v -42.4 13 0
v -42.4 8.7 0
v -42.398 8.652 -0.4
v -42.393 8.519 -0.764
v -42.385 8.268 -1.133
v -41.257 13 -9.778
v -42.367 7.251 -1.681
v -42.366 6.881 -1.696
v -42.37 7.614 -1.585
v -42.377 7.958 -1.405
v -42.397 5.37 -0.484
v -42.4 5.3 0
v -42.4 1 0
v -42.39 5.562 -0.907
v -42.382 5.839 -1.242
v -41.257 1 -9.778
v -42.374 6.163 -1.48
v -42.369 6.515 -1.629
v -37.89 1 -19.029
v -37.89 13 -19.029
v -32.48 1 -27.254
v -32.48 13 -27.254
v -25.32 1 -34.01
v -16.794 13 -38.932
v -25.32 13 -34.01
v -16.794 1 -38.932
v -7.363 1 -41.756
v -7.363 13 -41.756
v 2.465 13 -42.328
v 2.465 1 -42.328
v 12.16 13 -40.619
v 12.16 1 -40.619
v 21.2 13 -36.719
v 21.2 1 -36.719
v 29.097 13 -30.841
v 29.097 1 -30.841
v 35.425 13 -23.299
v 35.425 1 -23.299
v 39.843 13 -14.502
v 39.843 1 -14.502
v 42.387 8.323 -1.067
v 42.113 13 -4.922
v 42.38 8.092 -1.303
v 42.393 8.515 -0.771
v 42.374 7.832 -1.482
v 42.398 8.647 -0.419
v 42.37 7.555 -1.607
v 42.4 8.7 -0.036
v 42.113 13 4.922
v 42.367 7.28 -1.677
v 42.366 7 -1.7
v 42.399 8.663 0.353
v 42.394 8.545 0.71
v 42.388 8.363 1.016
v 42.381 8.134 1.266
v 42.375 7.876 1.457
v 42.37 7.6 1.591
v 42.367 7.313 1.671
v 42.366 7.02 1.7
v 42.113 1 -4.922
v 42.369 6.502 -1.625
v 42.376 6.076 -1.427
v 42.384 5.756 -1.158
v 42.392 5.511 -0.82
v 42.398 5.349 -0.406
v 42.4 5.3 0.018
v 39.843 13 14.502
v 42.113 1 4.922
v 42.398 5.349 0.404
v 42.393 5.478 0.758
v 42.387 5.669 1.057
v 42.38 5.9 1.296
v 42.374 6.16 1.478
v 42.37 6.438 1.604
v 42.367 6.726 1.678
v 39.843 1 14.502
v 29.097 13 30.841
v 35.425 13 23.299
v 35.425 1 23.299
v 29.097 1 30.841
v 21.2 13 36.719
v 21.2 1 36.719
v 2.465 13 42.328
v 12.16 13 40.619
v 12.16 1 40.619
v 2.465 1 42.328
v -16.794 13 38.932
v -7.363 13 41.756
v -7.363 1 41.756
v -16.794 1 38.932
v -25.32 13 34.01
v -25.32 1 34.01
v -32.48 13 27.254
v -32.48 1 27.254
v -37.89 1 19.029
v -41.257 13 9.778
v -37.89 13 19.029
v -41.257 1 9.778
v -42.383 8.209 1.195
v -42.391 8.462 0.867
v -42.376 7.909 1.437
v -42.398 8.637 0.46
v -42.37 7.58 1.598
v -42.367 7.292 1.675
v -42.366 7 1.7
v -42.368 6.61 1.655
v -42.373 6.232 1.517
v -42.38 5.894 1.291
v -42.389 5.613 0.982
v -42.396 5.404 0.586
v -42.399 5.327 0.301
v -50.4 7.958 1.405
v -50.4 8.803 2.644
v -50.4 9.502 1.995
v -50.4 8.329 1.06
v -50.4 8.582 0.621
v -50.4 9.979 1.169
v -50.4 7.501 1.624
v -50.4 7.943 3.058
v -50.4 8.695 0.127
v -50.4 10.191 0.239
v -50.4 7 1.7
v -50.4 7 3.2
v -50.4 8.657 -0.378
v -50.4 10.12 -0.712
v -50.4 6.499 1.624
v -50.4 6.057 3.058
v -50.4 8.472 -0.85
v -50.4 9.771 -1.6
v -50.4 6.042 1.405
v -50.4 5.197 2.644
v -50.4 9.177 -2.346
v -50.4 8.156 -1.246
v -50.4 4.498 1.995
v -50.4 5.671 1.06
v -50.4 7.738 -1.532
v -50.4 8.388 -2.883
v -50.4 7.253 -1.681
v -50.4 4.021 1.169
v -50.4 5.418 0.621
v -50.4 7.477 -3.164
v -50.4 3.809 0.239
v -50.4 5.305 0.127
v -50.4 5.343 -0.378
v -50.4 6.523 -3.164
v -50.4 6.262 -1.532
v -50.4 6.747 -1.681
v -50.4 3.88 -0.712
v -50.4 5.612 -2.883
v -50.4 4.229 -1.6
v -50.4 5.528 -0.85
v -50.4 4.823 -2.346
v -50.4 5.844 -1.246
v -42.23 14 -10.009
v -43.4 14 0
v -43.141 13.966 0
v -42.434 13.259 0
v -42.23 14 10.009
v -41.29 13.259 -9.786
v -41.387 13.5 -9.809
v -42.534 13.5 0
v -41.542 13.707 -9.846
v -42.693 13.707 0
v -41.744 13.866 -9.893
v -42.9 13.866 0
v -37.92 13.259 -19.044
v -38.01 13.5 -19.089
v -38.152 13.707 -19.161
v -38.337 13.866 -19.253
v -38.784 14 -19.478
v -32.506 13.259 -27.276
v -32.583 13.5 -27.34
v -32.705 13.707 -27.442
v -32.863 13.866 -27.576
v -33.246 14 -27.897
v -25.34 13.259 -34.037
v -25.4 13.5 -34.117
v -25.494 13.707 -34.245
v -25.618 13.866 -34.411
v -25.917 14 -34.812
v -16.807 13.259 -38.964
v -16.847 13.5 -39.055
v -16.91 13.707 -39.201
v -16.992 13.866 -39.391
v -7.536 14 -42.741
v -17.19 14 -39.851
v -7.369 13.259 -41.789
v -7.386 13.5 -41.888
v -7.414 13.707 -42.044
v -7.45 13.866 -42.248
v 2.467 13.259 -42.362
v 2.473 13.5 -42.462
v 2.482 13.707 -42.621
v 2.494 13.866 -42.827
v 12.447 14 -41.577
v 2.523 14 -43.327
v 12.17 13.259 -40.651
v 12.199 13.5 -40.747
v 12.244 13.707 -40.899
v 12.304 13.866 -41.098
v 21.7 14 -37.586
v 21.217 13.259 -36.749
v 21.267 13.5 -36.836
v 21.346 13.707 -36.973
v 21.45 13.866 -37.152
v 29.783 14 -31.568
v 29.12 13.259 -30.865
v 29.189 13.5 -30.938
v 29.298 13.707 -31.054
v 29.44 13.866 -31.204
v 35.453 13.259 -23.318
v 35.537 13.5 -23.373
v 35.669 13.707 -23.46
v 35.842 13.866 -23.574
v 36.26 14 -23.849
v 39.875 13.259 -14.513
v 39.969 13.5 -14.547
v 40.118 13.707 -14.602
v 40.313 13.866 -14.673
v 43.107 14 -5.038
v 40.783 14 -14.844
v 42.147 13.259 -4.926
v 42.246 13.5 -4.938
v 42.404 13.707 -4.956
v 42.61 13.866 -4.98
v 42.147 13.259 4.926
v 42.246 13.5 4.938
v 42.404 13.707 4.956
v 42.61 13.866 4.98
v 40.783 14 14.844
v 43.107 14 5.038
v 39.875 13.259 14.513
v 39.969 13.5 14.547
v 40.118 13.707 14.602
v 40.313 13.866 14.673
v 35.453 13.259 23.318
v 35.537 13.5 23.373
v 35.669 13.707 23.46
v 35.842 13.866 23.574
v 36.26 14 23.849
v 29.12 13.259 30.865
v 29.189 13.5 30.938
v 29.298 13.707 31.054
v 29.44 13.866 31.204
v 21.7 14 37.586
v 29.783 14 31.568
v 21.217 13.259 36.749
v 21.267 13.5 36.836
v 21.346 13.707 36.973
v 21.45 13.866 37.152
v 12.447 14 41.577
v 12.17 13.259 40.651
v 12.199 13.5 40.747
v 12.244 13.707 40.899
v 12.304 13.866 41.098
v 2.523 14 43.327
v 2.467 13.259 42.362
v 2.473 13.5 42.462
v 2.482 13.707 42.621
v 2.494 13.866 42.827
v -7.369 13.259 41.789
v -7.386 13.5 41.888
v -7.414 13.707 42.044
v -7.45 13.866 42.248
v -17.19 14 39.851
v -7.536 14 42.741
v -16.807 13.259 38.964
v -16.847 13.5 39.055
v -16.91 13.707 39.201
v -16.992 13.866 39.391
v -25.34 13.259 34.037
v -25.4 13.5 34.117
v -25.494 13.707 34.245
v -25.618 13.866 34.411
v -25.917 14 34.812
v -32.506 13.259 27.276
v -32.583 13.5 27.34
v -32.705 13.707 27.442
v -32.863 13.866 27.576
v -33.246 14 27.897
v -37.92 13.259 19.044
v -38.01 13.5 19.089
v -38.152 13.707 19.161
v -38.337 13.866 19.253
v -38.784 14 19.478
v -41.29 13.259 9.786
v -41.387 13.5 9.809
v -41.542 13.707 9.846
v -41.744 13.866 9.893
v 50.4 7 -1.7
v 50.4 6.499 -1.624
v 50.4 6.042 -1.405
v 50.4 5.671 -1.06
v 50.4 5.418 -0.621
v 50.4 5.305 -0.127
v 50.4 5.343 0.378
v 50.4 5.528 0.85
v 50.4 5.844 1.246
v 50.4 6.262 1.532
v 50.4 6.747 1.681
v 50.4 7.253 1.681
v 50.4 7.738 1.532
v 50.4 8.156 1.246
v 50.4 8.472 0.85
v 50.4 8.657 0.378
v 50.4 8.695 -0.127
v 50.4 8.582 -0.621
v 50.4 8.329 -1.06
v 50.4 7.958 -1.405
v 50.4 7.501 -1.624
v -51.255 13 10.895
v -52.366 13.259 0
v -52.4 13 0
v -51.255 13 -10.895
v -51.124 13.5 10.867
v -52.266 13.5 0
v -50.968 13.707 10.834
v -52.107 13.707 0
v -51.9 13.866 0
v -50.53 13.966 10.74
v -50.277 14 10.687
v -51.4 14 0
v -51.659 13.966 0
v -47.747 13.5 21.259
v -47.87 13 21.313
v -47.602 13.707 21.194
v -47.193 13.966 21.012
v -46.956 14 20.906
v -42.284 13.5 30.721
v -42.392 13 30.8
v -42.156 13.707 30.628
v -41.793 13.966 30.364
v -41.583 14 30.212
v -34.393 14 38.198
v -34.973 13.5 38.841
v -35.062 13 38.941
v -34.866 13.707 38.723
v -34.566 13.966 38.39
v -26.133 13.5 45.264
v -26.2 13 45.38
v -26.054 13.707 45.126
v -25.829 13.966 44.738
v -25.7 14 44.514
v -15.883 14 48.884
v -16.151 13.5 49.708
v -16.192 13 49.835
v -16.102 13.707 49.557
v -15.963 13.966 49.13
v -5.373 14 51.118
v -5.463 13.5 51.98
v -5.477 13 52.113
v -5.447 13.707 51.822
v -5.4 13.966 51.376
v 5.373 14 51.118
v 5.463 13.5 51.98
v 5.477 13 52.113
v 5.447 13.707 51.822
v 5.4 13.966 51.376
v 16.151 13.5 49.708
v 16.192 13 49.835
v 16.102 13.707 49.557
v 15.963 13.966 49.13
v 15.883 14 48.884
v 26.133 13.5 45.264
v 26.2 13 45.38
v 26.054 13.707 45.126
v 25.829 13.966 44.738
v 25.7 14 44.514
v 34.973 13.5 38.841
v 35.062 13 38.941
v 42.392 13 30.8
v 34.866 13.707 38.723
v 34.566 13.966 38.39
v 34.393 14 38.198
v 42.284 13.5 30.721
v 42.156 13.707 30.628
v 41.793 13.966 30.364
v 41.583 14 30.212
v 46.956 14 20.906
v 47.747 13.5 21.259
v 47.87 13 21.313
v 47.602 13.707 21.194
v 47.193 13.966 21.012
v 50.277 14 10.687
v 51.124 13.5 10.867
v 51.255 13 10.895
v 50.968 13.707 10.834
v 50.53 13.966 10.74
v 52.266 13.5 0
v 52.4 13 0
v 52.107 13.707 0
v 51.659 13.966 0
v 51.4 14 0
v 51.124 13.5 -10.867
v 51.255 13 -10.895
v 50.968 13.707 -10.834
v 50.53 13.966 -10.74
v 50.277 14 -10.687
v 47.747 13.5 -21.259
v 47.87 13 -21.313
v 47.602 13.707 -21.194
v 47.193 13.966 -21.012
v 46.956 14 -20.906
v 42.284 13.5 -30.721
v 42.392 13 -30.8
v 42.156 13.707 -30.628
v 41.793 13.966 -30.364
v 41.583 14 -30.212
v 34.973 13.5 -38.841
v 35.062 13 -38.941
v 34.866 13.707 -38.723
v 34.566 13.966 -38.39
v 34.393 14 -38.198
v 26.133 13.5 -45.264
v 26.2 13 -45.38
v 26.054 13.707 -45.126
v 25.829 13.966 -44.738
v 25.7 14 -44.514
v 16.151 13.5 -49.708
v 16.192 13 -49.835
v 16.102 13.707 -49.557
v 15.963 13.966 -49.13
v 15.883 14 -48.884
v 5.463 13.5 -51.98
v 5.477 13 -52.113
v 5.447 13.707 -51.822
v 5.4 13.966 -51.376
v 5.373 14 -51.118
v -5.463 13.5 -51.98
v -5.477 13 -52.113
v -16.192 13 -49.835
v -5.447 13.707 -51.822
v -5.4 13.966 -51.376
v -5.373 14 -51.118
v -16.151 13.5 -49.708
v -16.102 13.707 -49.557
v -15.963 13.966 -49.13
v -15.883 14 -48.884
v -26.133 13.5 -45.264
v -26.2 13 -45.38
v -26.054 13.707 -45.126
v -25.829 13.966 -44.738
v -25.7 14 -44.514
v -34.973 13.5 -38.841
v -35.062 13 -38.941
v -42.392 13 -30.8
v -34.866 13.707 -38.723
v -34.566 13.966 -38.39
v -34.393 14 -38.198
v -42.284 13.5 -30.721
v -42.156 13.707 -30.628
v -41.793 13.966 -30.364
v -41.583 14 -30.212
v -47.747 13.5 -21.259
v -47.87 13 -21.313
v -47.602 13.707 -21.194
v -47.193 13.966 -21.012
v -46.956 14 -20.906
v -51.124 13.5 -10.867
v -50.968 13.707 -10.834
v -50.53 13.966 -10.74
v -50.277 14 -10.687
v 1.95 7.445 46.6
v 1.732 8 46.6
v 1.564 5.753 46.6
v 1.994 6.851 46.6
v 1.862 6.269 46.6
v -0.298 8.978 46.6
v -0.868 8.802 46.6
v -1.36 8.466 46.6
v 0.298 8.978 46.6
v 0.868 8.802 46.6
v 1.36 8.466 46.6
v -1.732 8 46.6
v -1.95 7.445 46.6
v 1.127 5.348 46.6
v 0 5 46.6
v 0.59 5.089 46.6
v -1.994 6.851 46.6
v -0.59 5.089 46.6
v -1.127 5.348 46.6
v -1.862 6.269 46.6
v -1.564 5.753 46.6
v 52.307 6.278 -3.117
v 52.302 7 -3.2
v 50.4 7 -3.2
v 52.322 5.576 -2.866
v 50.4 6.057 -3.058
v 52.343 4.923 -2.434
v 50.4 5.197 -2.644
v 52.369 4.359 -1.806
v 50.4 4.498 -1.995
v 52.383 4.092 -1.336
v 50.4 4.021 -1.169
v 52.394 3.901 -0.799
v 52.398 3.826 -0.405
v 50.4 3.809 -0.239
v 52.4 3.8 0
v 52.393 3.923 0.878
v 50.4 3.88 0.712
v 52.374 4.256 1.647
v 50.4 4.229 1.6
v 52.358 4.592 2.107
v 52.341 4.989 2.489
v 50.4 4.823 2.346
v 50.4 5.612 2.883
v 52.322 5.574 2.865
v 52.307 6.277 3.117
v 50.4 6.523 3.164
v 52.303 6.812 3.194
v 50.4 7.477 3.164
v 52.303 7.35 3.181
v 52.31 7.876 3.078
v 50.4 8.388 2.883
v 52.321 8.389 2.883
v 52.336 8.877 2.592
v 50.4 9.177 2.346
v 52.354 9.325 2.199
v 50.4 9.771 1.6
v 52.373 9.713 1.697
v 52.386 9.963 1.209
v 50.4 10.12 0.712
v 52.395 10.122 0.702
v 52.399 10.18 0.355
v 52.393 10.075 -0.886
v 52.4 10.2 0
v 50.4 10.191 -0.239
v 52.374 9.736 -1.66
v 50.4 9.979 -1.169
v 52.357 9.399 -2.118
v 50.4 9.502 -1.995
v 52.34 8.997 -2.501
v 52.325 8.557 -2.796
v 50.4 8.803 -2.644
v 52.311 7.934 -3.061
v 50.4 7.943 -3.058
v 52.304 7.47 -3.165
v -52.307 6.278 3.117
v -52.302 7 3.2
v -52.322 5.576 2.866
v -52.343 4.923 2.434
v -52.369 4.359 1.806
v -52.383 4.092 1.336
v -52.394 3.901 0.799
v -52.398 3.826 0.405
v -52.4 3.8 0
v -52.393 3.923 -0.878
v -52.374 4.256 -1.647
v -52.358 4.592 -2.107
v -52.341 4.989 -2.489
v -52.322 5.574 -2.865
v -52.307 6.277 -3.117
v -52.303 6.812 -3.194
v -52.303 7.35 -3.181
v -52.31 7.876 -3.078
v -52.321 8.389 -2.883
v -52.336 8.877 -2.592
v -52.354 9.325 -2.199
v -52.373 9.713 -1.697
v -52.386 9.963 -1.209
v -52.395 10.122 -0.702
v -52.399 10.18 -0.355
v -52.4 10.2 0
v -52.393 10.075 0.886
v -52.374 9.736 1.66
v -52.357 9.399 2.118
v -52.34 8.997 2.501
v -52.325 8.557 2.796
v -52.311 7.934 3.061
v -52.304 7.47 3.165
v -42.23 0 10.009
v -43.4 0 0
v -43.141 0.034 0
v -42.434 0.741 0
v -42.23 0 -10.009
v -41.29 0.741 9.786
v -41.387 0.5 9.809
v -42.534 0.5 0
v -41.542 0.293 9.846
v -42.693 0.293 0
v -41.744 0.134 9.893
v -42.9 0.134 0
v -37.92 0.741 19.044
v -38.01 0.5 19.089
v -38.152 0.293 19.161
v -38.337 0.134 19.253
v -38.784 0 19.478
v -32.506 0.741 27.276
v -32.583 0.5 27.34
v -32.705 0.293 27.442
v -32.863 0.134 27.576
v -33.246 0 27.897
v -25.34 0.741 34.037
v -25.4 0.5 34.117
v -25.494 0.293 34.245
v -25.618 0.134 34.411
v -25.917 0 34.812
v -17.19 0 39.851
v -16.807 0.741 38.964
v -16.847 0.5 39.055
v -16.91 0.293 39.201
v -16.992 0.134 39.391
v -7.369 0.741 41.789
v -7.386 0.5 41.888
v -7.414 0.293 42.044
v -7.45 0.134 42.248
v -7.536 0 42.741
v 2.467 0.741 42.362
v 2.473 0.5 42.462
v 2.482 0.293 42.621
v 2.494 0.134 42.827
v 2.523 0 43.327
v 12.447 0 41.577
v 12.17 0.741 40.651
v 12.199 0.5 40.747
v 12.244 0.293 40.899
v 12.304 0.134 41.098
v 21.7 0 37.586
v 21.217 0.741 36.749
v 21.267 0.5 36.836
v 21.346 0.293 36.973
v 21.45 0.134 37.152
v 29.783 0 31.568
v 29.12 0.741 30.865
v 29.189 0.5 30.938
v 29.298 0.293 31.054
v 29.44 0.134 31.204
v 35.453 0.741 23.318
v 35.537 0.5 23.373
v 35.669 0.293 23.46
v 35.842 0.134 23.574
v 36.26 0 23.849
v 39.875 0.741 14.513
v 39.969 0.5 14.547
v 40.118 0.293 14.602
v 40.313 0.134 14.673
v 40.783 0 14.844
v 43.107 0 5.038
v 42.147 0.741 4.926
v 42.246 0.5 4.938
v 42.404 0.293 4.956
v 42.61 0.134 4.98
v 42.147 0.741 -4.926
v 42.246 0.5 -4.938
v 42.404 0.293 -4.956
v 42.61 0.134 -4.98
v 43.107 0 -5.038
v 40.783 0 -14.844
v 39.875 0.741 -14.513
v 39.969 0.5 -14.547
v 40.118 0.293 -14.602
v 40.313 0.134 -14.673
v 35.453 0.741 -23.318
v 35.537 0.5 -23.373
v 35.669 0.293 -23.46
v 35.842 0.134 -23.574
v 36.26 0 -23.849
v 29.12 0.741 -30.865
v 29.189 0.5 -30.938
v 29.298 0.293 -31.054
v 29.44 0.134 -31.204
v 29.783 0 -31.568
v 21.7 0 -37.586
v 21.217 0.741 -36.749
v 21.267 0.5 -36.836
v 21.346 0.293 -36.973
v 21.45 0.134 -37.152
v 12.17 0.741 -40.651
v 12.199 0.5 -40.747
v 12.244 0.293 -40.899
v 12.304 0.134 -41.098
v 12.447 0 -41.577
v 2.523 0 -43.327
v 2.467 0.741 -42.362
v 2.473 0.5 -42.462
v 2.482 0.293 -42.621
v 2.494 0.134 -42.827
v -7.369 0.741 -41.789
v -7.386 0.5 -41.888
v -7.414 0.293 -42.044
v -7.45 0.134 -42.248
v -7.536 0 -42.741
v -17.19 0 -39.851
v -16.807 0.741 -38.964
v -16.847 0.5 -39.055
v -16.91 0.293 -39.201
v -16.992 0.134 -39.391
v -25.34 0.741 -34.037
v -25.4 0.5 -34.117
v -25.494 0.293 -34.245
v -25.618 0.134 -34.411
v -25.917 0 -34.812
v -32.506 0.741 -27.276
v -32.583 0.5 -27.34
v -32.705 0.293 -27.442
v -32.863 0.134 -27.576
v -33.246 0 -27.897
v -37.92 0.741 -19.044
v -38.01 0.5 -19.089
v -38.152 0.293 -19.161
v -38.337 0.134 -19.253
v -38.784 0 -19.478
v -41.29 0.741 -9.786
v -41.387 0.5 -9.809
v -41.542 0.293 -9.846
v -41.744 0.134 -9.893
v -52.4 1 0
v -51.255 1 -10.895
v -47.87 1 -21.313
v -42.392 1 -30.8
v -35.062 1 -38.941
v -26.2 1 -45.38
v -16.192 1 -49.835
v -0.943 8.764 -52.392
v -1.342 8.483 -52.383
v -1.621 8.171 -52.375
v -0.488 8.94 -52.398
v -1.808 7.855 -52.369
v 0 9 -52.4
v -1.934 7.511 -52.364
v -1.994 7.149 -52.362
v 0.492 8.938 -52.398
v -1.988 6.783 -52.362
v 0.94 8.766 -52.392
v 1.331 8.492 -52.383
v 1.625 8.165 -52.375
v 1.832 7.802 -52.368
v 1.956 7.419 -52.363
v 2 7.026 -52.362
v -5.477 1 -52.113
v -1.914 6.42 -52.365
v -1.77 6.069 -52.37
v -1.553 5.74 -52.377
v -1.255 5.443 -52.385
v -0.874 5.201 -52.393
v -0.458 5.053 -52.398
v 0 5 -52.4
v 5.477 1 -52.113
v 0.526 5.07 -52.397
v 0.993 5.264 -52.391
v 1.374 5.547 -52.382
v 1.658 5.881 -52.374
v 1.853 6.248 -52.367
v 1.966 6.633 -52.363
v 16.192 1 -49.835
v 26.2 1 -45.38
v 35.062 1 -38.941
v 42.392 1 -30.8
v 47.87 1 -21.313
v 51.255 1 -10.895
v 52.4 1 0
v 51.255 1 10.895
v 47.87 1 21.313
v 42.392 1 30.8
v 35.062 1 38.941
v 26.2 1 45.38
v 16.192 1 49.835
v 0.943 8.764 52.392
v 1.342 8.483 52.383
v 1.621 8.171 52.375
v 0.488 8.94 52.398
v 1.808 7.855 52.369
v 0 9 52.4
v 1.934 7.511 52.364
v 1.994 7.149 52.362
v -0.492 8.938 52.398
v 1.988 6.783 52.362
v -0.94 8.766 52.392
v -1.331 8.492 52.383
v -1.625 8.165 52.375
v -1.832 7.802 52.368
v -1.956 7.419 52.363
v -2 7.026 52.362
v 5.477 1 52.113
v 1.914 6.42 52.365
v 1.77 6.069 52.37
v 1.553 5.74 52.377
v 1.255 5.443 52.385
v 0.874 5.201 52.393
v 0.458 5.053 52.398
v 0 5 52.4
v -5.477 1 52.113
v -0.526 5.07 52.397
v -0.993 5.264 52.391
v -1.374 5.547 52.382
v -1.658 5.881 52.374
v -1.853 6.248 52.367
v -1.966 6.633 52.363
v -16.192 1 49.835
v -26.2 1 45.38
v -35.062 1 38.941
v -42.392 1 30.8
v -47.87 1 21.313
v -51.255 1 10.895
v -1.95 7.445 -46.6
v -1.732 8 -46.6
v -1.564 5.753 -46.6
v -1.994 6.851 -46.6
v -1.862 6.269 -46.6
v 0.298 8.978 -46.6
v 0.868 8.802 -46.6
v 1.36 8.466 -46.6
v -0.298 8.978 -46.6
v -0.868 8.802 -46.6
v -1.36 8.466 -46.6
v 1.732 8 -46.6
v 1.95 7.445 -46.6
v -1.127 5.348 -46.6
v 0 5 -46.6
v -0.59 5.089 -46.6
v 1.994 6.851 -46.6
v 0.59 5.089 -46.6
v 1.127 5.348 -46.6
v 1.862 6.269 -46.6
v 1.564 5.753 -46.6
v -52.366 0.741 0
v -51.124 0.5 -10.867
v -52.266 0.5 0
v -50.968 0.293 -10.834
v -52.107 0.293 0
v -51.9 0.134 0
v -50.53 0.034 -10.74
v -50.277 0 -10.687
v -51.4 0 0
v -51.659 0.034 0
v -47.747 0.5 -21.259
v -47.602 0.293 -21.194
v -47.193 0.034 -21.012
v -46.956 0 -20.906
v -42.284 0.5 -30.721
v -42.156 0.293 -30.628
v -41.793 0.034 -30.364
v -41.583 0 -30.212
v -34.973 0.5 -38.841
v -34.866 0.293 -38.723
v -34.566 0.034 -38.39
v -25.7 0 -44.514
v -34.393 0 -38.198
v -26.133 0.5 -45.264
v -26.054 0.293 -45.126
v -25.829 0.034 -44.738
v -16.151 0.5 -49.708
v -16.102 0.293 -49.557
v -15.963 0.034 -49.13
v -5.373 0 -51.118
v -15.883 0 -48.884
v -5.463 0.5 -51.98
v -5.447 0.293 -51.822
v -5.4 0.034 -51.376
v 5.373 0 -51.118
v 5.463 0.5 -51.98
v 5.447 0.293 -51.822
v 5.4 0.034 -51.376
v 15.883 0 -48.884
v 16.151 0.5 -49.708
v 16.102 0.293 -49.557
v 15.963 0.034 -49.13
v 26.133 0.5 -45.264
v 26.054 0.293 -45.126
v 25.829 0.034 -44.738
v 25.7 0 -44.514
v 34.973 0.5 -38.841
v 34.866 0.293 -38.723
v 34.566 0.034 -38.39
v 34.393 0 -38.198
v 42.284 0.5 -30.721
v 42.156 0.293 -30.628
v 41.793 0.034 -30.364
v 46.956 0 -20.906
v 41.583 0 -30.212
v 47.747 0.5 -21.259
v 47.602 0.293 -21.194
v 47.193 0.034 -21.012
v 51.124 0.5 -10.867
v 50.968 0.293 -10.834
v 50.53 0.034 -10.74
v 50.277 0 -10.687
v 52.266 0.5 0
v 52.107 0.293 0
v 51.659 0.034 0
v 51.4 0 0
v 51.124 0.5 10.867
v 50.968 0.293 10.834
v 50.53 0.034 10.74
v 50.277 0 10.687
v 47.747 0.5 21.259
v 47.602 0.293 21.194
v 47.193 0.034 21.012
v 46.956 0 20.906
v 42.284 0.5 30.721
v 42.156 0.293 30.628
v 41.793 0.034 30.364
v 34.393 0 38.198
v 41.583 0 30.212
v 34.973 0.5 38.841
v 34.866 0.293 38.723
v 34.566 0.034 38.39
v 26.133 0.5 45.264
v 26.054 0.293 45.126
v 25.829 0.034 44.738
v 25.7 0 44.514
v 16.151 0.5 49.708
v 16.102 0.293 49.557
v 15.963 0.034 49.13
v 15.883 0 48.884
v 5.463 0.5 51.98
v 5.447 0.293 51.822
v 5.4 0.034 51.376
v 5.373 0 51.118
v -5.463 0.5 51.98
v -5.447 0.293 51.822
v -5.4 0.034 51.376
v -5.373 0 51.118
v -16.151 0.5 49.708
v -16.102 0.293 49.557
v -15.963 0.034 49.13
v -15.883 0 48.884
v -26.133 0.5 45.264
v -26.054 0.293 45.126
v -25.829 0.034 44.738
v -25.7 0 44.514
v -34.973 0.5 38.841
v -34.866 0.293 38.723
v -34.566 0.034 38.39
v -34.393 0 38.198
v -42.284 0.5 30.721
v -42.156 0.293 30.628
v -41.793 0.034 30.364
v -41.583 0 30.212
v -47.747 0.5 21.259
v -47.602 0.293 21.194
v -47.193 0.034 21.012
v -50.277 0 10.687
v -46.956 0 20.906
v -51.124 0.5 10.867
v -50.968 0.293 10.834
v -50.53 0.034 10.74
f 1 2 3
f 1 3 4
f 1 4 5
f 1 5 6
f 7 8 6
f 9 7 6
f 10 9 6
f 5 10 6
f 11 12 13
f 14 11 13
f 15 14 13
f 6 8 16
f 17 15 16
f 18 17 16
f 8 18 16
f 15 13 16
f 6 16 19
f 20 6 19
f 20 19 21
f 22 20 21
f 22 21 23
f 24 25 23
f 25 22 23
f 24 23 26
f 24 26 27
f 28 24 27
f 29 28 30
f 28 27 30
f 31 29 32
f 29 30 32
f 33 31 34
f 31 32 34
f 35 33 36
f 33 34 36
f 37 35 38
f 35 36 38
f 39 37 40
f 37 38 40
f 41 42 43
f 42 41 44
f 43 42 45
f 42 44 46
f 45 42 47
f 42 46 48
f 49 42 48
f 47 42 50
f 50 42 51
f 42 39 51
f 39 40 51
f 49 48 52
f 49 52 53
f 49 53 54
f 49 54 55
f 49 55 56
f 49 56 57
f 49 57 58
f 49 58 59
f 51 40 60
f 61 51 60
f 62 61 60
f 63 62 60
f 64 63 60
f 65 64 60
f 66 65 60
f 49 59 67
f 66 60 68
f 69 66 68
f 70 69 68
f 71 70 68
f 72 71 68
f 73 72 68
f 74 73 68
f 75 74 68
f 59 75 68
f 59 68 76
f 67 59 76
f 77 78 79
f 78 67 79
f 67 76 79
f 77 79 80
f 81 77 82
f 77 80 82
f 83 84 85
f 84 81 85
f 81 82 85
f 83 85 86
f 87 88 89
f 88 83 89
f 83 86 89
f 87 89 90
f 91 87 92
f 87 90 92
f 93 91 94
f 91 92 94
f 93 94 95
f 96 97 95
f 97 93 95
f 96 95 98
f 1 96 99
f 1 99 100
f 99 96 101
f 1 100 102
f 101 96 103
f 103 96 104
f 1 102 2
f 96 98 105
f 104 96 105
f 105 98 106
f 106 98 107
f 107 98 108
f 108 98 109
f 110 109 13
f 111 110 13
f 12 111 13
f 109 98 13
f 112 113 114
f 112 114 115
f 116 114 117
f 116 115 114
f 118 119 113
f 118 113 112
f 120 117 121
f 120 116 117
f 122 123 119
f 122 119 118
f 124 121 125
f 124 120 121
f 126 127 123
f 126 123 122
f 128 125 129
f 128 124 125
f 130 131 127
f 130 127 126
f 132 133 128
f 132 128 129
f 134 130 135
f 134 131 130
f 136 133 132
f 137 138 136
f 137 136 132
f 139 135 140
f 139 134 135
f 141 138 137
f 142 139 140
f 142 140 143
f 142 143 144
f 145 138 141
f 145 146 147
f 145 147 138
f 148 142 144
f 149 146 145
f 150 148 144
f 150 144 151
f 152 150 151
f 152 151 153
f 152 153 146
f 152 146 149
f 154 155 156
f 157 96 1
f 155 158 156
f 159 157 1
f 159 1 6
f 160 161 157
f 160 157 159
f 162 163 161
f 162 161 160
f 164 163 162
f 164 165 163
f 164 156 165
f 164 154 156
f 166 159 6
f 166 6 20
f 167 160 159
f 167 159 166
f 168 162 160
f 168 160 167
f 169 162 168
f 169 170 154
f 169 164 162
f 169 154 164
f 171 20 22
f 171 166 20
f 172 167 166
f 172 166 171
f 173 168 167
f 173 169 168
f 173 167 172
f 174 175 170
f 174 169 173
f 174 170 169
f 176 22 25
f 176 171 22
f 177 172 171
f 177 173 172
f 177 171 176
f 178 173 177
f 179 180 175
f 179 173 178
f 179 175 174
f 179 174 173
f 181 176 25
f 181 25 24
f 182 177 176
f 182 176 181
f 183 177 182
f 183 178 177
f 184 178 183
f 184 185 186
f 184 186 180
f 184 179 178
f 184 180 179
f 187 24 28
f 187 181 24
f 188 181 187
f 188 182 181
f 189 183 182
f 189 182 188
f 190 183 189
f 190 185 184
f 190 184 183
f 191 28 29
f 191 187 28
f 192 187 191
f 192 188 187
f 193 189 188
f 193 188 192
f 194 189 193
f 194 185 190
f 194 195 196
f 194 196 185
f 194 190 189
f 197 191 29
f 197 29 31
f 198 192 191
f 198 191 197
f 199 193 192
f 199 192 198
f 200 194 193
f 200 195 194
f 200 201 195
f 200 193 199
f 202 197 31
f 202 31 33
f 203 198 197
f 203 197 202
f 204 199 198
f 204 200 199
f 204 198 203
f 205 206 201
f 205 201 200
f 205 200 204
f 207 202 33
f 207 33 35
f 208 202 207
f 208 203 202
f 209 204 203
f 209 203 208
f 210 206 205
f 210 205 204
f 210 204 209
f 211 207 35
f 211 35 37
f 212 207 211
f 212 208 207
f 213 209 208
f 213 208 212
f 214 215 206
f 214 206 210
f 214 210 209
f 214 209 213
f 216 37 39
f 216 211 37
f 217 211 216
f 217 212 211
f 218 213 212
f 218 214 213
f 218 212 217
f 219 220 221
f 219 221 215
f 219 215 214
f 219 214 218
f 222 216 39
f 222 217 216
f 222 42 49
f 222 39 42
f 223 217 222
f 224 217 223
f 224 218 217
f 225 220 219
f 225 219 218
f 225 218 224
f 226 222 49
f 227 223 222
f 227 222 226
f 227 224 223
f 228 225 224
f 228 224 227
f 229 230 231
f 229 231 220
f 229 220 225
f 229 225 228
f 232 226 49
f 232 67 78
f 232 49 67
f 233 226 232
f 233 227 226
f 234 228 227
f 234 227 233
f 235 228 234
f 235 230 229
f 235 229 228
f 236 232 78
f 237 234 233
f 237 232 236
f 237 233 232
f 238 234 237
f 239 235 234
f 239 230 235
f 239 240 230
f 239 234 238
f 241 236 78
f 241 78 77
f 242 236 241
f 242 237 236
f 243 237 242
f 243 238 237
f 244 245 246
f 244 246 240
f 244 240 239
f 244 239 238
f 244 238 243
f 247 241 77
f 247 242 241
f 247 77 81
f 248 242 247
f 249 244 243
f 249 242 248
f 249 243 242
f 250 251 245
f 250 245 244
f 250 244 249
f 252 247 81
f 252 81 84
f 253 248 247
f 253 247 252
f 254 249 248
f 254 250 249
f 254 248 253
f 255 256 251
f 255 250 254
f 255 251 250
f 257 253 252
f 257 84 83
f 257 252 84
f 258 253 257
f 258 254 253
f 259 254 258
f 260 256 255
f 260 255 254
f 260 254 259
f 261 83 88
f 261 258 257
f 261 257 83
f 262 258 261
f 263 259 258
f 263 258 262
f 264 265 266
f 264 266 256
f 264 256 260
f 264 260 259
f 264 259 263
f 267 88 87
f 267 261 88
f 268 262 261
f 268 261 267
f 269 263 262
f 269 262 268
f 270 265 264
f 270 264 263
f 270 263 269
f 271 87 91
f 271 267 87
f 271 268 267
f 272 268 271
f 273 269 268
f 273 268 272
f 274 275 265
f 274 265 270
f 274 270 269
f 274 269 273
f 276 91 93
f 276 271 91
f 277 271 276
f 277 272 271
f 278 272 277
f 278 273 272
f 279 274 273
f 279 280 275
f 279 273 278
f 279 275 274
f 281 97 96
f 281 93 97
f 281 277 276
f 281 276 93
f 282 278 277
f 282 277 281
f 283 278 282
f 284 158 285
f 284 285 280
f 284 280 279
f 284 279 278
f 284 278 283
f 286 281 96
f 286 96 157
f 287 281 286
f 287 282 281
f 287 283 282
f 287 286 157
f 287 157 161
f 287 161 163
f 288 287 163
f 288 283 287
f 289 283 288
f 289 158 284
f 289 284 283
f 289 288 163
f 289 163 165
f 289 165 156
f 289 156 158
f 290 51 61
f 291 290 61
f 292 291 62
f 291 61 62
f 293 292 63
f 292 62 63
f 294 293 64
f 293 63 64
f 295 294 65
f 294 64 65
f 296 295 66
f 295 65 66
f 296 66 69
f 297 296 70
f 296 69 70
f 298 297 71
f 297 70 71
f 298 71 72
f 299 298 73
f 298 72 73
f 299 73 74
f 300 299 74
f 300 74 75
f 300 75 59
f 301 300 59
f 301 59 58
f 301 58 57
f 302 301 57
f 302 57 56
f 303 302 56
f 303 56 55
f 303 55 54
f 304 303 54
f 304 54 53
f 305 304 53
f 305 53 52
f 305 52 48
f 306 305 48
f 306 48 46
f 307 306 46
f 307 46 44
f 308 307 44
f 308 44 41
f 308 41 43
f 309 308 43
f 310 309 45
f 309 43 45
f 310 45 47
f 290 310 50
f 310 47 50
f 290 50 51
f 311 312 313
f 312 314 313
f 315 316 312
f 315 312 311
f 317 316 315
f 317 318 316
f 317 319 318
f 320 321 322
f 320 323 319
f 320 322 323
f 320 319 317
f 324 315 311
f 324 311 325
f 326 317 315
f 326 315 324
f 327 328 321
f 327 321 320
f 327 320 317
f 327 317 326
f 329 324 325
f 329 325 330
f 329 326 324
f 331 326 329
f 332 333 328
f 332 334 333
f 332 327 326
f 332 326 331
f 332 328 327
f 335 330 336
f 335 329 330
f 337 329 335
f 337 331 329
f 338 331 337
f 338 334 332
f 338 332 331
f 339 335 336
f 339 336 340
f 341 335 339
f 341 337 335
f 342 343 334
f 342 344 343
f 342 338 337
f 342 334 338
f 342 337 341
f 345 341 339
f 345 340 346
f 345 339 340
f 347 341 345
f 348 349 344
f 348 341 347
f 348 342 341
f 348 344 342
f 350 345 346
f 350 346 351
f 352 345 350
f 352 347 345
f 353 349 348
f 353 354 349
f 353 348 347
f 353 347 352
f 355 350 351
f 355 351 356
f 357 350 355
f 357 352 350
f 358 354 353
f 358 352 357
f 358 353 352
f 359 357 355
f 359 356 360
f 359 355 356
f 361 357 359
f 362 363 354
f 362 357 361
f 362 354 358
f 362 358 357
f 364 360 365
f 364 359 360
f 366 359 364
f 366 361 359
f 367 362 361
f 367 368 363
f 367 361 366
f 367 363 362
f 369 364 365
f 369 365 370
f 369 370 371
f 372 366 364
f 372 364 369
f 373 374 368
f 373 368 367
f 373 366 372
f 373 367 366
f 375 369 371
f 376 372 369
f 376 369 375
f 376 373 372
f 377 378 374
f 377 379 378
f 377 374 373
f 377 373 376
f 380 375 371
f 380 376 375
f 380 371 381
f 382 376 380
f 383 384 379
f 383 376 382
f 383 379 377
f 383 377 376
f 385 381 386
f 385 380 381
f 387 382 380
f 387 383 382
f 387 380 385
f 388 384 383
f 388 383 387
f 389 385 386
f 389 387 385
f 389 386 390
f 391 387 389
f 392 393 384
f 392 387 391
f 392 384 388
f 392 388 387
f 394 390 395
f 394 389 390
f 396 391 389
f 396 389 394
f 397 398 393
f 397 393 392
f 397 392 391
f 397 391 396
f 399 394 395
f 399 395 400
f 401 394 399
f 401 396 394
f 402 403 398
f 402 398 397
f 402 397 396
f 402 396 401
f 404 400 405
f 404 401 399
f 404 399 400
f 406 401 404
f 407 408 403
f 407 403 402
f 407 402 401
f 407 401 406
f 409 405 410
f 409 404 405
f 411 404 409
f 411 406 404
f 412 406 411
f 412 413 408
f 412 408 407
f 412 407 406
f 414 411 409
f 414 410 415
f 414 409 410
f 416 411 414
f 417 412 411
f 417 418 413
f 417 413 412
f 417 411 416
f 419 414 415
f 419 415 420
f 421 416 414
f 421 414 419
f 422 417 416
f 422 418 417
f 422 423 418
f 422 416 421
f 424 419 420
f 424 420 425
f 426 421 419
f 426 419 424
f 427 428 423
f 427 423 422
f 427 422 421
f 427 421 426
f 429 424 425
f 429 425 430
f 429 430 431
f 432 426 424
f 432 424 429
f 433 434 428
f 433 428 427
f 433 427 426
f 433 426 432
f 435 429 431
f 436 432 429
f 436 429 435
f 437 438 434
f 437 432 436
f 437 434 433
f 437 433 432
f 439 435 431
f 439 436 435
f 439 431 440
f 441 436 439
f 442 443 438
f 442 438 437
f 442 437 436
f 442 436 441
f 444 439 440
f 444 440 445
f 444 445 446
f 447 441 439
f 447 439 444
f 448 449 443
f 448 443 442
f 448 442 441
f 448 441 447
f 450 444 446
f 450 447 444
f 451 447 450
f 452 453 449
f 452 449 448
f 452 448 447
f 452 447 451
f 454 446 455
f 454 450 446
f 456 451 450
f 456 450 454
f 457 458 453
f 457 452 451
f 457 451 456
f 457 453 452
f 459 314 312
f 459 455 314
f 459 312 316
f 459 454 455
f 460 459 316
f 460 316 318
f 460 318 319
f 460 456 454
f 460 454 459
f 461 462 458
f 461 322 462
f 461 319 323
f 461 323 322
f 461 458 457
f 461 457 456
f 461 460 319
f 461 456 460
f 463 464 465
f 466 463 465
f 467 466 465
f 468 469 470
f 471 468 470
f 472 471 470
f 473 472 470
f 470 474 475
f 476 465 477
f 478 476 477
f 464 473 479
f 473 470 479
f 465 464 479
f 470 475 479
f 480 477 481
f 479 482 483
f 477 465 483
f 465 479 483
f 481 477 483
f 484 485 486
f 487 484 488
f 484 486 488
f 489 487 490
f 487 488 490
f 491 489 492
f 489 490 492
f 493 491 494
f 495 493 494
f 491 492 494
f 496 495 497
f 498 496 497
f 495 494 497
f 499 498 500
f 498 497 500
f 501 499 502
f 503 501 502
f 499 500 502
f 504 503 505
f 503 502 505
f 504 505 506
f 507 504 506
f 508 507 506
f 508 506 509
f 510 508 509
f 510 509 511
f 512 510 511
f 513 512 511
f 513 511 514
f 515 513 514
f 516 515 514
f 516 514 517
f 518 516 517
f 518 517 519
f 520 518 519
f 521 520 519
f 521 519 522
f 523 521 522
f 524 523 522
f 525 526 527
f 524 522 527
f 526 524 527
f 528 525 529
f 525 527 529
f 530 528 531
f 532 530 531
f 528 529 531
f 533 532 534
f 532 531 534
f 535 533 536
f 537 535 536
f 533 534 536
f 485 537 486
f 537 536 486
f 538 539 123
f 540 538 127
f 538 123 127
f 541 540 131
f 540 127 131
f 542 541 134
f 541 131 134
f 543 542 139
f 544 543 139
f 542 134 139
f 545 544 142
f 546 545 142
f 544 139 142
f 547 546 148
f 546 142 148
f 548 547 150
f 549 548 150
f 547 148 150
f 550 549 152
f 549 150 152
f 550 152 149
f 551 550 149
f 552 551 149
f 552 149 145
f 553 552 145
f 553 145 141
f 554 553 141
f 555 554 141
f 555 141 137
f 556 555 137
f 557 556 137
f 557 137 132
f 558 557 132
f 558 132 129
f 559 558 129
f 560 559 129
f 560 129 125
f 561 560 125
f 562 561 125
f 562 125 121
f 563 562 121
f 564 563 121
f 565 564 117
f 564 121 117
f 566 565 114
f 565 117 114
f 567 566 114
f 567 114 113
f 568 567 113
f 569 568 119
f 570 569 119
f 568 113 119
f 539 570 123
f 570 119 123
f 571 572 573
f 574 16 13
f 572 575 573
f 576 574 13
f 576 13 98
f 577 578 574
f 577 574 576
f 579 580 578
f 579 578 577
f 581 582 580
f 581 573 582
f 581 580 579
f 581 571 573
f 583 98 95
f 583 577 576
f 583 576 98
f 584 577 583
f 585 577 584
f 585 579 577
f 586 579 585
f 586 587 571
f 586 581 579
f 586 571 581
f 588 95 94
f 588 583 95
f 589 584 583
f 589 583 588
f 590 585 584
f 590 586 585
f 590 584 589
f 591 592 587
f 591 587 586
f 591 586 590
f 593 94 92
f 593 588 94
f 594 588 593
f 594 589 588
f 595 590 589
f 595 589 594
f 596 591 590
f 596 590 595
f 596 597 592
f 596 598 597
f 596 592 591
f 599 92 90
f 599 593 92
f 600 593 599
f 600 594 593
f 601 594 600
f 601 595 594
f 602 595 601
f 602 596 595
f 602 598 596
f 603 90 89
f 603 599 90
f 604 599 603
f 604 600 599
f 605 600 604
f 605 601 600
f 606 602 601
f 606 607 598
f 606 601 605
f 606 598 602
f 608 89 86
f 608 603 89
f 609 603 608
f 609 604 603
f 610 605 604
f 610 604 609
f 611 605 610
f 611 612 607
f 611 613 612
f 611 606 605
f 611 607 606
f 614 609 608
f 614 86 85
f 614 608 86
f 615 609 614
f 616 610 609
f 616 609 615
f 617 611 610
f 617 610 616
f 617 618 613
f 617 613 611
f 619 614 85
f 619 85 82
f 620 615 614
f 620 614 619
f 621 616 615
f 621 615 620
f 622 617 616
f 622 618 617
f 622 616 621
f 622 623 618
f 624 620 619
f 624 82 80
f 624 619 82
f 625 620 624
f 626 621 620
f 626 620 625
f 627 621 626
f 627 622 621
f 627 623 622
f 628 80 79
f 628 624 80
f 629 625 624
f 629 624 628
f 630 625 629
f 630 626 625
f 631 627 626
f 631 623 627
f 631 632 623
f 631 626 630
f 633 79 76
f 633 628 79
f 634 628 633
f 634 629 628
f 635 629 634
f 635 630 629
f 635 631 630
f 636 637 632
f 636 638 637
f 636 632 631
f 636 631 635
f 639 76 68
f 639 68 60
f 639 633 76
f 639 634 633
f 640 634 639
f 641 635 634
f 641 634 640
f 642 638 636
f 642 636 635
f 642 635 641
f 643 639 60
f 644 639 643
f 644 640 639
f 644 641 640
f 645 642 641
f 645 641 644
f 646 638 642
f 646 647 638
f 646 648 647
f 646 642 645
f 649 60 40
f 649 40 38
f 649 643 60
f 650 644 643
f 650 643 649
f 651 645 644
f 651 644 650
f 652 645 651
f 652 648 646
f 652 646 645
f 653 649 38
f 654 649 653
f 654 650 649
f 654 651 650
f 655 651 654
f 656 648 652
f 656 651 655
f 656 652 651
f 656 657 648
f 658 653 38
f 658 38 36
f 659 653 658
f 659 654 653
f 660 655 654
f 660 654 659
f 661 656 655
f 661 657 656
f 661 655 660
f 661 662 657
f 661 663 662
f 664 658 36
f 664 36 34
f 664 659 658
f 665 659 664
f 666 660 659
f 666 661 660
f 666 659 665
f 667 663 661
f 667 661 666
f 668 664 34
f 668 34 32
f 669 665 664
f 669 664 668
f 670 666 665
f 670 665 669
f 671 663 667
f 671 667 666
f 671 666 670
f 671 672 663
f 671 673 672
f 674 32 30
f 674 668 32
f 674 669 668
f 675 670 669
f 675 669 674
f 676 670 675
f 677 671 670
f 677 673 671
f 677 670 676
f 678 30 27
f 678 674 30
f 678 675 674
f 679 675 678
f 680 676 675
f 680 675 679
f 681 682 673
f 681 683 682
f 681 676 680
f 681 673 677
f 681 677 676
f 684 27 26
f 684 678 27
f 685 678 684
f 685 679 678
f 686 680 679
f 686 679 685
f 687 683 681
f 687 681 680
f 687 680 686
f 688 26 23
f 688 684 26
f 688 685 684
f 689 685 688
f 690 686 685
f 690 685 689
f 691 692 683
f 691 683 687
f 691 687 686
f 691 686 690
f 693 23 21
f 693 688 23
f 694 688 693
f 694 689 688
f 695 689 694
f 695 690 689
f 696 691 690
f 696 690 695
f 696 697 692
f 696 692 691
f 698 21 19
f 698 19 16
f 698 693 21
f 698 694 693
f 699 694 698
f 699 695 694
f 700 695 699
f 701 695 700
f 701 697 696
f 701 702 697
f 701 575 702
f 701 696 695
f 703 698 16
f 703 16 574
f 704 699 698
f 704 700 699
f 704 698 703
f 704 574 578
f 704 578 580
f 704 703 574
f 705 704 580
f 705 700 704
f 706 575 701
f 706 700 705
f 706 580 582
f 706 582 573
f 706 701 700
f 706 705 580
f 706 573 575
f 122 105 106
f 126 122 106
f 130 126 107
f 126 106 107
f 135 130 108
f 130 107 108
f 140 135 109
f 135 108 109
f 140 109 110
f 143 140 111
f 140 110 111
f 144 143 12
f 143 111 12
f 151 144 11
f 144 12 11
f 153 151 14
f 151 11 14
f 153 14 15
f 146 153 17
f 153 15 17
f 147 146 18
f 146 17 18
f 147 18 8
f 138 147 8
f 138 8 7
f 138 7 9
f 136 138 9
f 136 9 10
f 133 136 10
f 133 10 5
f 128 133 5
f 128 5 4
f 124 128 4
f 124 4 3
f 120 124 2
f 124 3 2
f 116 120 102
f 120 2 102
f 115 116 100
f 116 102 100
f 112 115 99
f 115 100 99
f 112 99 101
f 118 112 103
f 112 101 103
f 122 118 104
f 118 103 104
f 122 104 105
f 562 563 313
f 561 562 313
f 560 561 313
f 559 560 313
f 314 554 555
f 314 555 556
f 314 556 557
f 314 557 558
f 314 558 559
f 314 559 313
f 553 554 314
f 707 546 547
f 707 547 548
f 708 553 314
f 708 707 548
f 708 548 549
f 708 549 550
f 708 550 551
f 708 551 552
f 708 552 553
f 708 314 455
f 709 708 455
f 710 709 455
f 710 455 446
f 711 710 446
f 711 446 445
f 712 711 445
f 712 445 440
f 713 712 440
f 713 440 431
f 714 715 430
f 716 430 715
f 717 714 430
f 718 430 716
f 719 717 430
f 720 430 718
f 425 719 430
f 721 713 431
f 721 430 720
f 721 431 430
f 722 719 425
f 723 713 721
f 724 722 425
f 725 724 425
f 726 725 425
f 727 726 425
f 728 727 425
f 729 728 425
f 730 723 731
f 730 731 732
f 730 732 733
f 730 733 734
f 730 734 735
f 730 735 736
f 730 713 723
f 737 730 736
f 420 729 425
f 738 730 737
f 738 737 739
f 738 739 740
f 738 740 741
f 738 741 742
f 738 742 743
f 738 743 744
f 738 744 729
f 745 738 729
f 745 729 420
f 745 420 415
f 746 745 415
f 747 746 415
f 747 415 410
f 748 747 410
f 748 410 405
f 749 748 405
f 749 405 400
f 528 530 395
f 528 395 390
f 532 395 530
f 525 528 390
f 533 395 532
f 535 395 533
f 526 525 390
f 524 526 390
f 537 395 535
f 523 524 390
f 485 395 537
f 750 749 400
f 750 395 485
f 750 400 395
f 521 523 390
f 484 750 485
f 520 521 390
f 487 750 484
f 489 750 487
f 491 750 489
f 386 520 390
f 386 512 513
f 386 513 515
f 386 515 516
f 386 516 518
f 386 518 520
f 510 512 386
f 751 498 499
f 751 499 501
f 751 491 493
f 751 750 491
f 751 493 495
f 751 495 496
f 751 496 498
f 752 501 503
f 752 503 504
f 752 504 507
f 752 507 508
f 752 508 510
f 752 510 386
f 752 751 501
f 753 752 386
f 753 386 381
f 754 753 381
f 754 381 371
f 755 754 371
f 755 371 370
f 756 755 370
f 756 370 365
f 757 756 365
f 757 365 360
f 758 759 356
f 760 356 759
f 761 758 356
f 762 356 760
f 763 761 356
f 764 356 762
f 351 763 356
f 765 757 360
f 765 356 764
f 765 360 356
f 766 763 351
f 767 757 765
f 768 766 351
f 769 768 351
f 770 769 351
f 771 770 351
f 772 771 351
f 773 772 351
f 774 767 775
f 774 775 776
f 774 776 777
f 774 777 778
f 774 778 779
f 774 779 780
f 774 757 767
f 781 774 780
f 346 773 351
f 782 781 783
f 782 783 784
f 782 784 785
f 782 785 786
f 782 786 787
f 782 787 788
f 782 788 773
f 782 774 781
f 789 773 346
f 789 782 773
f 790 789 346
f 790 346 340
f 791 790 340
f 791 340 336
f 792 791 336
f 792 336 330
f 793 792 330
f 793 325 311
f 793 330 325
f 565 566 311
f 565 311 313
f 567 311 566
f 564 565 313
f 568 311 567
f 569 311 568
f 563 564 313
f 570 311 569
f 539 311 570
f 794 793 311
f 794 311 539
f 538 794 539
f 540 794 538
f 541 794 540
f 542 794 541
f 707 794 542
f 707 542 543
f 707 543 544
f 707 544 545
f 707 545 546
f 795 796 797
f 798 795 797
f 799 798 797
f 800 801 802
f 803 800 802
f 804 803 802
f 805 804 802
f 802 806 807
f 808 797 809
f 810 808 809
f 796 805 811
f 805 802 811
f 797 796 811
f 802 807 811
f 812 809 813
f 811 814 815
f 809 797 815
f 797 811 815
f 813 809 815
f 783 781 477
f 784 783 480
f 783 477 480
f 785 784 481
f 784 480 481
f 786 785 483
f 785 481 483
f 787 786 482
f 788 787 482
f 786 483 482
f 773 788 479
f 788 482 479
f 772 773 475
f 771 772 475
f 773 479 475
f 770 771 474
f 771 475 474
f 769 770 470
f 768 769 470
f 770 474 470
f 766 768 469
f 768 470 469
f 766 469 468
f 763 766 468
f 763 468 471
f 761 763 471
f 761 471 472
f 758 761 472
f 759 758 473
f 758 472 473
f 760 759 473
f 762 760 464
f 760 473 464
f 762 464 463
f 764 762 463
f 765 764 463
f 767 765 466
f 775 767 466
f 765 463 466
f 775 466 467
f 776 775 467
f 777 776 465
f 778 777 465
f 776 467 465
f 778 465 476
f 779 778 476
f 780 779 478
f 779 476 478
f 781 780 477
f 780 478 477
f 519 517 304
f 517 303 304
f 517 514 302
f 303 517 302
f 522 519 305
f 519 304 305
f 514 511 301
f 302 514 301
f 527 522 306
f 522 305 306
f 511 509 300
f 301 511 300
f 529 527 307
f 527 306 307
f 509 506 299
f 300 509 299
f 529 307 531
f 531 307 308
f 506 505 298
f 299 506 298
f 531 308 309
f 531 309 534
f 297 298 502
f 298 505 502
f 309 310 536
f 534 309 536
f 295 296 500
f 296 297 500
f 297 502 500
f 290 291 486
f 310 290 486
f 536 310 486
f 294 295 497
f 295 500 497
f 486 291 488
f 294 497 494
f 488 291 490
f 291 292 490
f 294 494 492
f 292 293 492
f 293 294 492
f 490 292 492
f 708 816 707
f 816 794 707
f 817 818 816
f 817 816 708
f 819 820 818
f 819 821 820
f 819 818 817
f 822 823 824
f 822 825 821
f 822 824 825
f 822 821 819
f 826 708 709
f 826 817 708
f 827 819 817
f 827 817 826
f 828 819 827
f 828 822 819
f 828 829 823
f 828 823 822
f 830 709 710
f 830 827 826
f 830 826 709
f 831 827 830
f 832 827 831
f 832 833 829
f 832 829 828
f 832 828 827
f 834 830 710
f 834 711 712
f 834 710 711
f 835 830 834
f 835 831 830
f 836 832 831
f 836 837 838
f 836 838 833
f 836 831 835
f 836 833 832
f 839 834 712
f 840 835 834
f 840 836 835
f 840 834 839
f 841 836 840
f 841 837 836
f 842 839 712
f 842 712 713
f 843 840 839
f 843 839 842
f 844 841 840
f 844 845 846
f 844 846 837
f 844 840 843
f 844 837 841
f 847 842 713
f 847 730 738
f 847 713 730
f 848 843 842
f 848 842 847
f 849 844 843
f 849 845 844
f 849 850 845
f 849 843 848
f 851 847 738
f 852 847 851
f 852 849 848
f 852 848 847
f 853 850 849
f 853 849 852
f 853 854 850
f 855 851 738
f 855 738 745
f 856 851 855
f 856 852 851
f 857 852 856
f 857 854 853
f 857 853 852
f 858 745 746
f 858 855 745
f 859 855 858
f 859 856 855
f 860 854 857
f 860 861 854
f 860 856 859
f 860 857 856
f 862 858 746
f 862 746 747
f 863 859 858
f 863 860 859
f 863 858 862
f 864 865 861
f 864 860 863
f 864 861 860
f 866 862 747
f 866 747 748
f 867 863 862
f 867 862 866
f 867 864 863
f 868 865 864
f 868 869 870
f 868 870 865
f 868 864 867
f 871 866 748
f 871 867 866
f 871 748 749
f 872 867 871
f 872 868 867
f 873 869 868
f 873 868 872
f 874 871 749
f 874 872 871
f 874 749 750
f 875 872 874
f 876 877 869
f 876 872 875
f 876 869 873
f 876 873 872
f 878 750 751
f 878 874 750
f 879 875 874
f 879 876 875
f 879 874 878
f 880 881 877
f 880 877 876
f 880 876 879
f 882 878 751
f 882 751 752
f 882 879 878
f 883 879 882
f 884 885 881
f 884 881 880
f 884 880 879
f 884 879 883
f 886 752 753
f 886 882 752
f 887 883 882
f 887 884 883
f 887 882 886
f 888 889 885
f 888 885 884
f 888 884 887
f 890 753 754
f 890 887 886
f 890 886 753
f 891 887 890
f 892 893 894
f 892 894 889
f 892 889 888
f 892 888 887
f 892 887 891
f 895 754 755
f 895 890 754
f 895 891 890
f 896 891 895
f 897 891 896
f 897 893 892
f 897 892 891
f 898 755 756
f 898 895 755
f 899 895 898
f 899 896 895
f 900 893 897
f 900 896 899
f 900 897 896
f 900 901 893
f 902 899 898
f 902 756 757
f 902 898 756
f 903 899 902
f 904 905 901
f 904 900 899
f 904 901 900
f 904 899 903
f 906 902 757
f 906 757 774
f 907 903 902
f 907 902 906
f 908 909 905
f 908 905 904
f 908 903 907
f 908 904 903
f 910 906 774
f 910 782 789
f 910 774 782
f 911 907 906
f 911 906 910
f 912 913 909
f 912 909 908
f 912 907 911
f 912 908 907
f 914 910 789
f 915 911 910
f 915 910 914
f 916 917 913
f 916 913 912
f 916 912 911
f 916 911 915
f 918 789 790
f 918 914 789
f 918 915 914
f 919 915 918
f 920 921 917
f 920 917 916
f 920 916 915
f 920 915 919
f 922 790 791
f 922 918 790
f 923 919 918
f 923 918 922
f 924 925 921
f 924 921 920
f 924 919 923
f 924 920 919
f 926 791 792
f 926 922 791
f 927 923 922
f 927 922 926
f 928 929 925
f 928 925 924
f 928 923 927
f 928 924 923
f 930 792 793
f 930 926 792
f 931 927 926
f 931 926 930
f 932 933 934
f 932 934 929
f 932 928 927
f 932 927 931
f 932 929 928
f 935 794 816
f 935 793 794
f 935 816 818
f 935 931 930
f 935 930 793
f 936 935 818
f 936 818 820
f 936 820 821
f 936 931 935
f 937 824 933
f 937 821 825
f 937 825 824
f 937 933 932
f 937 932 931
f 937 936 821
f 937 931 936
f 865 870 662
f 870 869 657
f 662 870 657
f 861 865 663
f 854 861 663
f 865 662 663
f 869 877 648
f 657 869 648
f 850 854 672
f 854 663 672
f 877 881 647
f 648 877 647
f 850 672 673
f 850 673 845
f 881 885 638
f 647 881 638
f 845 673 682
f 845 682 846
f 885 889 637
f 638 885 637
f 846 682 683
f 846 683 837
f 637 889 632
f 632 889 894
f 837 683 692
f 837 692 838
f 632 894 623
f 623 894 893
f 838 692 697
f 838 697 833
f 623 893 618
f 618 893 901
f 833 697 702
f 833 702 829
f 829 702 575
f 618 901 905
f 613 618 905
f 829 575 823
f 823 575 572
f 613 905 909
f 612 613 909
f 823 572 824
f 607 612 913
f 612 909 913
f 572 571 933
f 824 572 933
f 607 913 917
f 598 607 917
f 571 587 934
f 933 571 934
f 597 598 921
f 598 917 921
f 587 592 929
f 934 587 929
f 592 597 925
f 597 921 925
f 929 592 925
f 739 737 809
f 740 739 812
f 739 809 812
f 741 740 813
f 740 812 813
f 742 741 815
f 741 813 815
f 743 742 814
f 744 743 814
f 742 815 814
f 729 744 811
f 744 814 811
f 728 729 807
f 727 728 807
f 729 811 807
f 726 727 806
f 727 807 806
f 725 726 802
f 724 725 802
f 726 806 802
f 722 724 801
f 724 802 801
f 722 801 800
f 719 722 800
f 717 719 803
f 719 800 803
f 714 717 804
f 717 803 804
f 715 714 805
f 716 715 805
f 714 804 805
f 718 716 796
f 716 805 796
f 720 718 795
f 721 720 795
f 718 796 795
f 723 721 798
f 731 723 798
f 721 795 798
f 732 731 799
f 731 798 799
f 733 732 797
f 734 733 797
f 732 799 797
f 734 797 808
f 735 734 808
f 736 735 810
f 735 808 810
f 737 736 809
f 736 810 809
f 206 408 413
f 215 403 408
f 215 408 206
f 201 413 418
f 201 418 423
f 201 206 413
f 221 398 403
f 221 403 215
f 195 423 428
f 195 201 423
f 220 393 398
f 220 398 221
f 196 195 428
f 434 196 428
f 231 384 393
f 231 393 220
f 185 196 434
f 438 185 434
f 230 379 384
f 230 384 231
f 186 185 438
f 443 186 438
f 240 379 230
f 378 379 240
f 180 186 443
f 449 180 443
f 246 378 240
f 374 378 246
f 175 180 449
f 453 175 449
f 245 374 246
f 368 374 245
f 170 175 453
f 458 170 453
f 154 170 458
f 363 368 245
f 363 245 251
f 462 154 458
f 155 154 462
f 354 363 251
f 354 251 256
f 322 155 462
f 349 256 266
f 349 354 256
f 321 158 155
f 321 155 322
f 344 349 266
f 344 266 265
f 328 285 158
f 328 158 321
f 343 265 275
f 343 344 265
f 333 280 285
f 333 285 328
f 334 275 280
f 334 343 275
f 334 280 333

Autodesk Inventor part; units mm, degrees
sketch "Sketch1" plane through (0, 0, 0) normal (0, 1, 0) x (-1, 0, 0)
  circle A0 centre (0, 0) radius 42.4
  circle A1 centre (0, 0) radius 52.4
  dimension "d0" = 84.8
  dimension "d1" = 10
extrude "Extrusion1" add sketch "Sketch1" along normal blind 14
fillet "Fillet1" radius 1 4 edges at (52.4, 14, 0) (42.4, 14, 0) (52.4, 0, 0) (42.4, 0, 0)
ref_plane "Work Plane1" through (52.4, 0, 0) normal (1, 0, 0) x (0, 1, 0)
sketch "Sketch2" plane through (52.4, 0, 0) normal (1, 0, 0) x (0, 1, 0)
  line L0 (0, 73.36) -> (0, -73.36) projected
  point P0 (0, 0)
  point P1 (7, 0)
  dimension "d5" = 7
hole "Hole1" at (52.4, 7, 0) direction (-1, 0, 0) diameter 3.4 end up to surface counterbore diameter 6.4 counterbore depth 2
pattern_circular "Circular Pattern1" count 2 over 360 about axis through (0, -10, 0) along (0, 1, 0) of "Hole1"
ref_plane "Work Plane7" through (0, 0, 52.4) normal (0, 0, 1) x (1, 0, 0)
sketch "Sketch8" plane through (0, 0, 52.4) normal (0, 0, 1) x (1, 0, 0)
  line L0 (-73.36, 0) -> (73.36, 0) projected
  point P0 (0, 0)
  point P1 (0, 7)
  dimension "d53" = 7
hole "Hole5" at (0, 7, 52.4) direction (0, 0, -1) diameter 4 depth 5.8
pattern_circular "Circular Pattern4" count 2 over 360 about axis through (0, -10, 0) along (0, 1, 0) of "Hole5"
equation "\"d5\" = 0.5 * d2"
equation "\"d53\" = 0.5 * d2"
equation "\"d2\" = 14"
properties part number "o-ring" material "ABS Plastic"
